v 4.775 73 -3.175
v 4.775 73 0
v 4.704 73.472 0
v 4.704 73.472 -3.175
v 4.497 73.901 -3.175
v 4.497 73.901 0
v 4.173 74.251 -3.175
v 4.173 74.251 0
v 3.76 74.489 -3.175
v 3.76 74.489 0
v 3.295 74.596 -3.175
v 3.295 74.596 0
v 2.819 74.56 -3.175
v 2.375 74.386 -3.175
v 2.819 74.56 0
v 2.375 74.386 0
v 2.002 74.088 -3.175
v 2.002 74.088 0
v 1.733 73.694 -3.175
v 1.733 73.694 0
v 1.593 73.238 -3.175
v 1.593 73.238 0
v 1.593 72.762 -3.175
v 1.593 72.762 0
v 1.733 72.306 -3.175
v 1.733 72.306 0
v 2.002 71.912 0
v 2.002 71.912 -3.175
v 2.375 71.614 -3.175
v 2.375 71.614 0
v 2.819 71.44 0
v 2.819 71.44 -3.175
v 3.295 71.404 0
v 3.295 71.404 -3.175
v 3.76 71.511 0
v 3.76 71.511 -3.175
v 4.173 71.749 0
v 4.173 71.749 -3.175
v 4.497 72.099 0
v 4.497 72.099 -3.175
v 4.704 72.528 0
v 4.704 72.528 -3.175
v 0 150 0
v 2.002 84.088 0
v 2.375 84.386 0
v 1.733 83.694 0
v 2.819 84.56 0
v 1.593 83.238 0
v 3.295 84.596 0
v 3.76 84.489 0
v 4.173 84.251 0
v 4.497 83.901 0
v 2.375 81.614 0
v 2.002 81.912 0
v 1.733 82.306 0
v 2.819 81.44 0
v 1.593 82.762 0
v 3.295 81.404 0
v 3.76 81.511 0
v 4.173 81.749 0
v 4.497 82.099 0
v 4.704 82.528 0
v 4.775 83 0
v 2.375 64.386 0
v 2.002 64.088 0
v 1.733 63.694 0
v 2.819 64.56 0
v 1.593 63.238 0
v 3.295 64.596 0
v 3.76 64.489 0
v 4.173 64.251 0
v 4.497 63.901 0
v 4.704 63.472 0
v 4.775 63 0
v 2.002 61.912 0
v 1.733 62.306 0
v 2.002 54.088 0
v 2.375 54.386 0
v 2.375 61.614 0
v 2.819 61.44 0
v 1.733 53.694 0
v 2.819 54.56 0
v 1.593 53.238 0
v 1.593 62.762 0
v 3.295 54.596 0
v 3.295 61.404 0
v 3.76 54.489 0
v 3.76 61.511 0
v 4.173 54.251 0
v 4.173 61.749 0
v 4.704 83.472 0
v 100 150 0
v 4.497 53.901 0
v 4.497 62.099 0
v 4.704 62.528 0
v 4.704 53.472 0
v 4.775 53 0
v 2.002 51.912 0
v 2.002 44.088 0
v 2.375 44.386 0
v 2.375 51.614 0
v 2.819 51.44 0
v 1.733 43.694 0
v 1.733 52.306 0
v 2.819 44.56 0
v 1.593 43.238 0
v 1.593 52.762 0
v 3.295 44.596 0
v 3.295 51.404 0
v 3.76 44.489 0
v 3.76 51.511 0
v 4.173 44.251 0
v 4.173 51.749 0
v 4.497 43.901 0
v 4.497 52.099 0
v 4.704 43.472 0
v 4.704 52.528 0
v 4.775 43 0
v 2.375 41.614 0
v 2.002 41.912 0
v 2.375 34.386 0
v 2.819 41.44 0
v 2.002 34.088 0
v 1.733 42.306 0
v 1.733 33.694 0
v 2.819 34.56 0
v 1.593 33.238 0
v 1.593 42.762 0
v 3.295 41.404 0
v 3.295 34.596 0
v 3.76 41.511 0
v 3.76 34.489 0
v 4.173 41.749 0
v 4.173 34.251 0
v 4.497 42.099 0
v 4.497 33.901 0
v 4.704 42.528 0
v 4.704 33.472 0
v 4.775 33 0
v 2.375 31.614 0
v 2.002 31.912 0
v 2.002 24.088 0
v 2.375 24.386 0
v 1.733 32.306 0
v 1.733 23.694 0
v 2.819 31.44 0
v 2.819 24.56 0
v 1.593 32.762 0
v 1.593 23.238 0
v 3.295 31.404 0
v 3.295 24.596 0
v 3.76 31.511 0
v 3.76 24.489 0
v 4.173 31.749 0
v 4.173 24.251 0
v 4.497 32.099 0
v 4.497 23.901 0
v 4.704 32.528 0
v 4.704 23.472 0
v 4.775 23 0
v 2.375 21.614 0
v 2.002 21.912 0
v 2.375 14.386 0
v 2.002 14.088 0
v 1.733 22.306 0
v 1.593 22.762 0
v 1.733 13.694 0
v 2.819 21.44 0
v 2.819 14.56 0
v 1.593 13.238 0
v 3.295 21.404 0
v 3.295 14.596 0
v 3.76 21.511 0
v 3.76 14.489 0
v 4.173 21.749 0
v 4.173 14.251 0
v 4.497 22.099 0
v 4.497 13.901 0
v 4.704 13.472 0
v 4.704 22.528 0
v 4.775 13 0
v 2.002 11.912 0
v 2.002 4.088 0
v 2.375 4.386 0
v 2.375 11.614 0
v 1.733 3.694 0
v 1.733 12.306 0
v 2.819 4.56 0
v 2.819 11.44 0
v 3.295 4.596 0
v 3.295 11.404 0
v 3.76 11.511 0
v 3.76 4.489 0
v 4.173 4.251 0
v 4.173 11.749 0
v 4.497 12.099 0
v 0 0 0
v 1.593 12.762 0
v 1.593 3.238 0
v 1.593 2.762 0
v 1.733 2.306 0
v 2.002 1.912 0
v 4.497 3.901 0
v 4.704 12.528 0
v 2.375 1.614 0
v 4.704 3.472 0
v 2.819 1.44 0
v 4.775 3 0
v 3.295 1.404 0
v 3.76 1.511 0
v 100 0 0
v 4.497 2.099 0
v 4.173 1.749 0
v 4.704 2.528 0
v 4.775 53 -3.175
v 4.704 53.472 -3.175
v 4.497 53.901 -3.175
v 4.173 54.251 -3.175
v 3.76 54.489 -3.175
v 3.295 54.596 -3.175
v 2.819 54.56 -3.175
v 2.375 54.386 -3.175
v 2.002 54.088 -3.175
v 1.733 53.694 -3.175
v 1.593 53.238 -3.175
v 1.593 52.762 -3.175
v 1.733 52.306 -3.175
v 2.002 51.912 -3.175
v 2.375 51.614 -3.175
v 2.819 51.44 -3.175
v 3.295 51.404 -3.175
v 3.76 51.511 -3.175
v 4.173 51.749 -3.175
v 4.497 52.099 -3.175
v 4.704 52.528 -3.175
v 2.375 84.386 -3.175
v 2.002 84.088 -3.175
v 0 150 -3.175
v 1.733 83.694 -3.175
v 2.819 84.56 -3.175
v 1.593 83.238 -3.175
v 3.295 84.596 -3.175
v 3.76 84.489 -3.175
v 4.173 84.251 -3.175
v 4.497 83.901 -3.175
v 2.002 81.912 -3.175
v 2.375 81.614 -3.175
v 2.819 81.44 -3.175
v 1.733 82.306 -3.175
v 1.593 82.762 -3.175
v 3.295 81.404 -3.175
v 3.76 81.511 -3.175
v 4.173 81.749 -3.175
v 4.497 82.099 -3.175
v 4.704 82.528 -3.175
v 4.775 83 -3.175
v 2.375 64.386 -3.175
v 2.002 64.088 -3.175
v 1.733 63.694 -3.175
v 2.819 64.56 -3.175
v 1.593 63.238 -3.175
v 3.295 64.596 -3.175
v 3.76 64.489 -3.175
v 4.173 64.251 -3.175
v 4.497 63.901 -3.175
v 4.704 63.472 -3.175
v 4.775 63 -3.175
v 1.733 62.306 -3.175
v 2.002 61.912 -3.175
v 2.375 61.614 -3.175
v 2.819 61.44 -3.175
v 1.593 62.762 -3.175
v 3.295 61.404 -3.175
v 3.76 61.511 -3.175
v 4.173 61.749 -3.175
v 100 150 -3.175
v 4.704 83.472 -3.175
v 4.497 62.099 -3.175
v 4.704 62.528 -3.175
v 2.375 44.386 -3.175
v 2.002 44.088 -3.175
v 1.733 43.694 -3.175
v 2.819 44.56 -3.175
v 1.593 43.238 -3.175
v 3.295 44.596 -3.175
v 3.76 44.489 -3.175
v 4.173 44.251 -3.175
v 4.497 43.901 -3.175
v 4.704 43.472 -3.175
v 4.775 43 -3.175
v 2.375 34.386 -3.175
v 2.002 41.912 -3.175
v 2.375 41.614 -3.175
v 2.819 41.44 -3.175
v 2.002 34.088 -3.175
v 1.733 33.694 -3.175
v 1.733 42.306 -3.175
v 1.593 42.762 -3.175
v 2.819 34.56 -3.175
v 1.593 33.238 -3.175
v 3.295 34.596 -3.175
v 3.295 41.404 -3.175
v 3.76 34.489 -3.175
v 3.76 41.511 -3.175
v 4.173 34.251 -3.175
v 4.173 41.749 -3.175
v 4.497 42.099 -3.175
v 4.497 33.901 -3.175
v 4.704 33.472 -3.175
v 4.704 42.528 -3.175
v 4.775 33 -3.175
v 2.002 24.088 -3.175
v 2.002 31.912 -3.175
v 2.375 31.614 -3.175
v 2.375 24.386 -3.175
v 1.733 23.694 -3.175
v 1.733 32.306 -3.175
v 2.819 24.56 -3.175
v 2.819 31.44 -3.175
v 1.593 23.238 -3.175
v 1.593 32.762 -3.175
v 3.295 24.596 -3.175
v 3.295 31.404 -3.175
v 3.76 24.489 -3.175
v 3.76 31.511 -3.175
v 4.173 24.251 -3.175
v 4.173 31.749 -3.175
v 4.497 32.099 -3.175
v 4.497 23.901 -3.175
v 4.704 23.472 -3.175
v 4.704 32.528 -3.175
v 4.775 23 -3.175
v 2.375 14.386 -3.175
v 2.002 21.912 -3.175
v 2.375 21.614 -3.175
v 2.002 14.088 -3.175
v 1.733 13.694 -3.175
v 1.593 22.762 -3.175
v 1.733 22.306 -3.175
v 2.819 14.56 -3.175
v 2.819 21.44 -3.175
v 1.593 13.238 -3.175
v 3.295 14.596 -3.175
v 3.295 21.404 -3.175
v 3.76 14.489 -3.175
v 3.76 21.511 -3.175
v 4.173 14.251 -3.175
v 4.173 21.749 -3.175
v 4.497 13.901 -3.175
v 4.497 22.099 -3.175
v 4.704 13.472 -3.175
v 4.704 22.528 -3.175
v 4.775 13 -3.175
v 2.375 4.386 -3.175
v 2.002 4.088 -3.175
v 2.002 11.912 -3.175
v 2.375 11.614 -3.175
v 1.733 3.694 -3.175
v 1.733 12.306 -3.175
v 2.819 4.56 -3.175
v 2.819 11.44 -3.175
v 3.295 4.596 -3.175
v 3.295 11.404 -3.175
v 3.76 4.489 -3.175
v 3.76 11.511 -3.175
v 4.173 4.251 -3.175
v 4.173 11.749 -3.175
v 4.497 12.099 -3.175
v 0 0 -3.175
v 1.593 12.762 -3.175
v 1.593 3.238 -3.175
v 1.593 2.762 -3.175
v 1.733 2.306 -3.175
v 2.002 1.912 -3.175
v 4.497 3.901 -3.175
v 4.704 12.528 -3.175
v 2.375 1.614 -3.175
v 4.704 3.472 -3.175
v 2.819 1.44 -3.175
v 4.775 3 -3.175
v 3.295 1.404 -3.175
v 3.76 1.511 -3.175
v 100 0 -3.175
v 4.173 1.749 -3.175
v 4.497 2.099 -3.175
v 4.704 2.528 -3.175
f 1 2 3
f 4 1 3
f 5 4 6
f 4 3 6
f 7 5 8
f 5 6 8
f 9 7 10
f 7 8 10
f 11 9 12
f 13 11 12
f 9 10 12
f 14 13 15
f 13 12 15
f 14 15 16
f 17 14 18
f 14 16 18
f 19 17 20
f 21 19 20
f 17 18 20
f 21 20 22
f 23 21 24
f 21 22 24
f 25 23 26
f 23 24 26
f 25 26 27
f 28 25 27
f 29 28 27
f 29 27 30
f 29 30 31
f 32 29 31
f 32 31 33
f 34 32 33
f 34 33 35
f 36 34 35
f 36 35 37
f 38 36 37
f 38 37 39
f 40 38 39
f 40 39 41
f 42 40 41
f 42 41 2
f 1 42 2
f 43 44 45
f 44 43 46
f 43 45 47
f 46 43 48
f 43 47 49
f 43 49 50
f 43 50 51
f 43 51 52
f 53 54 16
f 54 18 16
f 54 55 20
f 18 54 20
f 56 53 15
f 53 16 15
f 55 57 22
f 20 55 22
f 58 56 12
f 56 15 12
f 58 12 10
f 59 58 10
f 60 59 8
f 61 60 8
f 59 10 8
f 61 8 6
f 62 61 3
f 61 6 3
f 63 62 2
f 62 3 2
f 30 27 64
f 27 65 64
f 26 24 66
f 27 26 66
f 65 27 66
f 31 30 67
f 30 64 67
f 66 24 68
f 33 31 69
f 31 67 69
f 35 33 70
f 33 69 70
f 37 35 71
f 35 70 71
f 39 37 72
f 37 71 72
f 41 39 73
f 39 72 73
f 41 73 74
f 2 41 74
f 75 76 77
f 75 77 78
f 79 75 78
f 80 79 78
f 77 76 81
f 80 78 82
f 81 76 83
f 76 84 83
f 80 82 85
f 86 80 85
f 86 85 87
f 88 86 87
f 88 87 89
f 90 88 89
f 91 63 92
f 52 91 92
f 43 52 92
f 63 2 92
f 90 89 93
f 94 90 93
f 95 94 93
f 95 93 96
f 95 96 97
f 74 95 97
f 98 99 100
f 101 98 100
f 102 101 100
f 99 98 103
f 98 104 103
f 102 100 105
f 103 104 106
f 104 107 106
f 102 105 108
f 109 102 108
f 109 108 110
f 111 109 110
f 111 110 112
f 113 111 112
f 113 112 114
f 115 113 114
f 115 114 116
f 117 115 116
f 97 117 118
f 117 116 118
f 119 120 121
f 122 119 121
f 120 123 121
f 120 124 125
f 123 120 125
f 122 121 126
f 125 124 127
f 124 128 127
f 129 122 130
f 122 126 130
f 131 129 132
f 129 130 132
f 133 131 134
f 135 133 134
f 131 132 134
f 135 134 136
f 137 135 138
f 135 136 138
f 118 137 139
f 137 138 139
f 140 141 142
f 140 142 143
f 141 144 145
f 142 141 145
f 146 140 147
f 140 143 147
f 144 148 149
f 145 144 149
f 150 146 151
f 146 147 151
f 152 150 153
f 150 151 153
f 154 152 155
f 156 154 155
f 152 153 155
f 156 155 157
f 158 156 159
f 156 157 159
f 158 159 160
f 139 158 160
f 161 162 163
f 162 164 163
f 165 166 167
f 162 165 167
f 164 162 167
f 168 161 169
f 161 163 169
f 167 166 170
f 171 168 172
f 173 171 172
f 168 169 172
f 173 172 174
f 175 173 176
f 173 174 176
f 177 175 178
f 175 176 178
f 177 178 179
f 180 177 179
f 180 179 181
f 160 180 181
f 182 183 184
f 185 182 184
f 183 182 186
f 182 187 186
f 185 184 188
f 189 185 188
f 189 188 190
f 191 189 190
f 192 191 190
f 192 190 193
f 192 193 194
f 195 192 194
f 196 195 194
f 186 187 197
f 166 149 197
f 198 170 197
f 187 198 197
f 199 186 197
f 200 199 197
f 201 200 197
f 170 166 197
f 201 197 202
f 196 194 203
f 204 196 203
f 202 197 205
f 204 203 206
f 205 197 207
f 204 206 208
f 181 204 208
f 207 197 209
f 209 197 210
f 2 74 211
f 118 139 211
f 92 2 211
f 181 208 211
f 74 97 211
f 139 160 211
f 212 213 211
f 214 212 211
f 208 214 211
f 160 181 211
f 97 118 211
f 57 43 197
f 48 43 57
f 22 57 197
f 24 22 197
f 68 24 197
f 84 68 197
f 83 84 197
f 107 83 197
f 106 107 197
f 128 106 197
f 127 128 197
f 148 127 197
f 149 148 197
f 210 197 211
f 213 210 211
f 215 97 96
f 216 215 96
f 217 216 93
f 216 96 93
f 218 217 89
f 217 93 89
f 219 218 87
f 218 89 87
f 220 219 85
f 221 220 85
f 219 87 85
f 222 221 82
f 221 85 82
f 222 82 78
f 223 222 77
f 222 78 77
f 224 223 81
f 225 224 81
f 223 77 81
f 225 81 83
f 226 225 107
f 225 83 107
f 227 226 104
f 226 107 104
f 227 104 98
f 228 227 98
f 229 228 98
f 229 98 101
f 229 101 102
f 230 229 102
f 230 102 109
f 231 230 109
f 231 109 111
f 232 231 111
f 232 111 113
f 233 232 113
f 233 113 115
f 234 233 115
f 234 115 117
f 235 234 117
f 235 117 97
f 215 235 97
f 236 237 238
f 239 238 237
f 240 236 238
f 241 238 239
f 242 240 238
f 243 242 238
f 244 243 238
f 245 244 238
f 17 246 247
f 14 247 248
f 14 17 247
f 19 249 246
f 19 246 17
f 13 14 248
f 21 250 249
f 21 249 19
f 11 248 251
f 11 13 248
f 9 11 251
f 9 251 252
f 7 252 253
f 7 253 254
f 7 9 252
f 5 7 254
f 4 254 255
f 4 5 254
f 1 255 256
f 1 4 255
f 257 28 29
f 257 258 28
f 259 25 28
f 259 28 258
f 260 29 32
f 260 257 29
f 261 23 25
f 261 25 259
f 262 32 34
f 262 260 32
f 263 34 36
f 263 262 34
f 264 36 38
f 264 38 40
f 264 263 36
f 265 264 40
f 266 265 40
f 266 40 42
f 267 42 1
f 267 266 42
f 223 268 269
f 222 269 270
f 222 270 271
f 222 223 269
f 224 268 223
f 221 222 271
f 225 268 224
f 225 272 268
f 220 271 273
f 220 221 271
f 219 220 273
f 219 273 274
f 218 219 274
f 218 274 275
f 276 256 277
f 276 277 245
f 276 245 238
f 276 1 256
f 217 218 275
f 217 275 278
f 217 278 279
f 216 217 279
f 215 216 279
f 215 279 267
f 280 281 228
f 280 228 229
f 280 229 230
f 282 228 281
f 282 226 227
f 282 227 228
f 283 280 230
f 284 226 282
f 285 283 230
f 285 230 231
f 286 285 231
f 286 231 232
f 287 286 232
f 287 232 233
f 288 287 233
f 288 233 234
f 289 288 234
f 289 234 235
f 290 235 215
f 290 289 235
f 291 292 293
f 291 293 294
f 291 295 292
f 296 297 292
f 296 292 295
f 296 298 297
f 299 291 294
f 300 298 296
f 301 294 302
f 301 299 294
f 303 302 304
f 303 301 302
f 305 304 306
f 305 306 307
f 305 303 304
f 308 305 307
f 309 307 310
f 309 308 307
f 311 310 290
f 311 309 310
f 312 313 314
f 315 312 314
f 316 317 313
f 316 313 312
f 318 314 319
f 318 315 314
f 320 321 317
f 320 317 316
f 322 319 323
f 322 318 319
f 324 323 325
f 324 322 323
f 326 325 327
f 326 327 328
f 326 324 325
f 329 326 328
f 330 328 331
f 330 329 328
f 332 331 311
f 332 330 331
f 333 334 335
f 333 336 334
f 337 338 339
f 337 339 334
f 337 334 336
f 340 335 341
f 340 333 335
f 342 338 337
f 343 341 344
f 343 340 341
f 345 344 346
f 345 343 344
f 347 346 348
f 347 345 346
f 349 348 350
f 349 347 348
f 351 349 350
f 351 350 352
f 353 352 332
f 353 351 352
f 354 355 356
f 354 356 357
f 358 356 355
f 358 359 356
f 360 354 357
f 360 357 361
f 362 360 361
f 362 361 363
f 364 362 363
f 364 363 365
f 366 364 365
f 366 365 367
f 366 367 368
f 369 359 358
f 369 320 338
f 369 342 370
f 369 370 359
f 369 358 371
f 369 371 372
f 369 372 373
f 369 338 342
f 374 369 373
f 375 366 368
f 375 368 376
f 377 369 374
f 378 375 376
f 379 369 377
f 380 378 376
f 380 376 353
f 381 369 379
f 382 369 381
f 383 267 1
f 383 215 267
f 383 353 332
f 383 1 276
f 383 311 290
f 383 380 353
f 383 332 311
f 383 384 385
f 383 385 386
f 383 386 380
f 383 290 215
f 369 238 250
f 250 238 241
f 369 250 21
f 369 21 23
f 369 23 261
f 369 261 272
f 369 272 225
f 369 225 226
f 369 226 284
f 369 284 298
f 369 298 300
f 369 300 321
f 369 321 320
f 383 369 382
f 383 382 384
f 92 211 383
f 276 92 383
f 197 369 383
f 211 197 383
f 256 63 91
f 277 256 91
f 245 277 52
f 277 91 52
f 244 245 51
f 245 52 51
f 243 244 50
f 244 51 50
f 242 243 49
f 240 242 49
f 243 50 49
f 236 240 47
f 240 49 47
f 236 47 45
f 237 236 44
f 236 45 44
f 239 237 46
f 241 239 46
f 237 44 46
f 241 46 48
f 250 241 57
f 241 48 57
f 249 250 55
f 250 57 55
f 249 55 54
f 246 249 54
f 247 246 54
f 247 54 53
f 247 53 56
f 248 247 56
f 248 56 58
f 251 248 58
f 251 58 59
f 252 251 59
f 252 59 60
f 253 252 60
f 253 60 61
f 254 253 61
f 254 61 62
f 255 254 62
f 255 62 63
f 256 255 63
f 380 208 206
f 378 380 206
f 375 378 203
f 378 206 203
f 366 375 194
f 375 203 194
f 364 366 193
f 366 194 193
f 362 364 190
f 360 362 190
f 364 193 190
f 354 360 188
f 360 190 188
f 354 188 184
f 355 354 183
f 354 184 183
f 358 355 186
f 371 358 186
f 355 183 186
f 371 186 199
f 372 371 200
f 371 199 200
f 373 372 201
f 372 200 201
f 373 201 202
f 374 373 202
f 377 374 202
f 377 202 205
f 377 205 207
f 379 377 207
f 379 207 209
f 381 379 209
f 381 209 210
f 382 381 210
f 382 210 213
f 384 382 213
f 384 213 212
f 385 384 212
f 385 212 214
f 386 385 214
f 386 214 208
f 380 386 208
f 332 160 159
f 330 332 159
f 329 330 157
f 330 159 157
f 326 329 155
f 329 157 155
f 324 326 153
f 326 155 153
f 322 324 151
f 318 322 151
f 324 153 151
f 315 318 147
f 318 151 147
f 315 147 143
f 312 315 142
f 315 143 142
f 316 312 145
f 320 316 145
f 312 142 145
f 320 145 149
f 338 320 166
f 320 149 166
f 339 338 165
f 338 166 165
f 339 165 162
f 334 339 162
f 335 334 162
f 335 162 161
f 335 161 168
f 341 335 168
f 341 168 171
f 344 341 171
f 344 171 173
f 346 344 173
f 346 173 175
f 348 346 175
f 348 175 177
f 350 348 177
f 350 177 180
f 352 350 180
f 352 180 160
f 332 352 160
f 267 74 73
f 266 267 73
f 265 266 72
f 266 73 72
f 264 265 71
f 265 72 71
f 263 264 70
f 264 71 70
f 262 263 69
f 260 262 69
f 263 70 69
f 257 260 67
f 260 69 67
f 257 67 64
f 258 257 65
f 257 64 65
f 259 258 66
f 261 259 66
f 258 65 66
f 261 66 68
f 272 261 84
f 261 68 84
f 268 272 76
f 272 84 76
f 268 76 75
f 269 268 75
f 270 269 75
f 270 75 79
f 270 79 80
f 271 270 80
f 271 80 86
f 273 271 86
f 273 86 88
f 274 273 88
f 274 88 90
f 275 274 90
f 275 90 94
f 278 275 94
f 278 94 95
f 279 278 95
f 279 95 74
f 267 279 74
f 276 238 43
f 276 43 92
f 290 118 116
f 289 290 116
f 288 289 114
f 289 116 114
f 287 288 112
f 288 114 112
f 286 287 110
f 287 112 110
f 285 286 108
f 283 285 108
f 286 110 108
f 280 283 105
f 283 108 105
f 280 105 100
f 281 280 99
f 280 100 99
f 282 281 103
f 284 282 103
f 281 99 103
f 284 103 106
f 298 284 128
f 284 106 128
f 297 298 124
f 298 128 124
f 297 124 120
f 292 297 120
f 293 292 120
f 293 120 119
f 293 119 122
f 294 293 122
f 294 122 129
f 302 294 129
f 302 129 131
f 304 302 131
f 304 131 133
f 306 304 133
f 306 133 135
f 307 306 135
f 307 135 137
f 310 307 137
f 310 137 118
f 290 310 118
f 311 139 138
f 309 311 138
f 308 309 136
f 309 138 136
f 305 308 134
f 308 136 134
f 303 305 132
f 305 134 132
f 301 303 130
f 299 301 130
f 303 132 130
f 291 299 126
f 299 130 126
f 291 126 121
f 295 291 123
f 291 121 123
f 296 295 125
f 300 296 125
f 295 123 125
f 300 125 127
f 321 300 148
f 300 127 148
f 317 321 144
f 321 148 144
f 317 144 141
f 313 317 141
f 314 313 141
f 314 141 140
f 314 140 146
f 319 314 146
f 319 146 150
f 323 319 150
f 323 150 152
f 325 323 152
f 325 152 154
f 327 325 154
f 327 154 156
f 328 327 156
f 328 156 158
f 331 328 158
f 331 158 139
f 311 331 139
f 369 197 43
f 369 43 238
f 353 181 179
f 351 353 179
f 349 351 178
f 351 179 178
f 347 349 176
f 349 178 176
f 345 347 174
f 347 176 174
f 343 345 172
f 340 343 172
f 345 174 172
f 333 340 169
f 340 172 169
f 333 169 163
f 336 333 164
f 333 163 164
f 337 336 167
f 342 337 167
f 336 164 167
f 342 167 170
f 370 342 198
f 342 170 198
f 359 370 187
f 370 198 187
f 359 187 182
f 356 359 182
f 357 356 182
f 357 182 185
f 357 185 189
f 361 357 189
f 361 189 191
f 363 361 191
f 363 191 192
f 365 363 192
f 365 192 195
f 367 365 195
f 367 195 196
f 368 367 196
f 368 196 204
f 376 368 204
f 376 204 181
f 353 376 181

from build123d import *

# Parameters (mm, degrees)
SKETCH1_W           = 100
SKETCH1_H           = 3.175
BOSS_EXTRUDE1_DEPTH = 150
SKETCH2_R           = 1.6
CUT_EXTRUDE2_DEPTH  = 5
SKETCH2_14_R        = 1.6
CUT_EXTRUDE3_DEPTH  = 5
SKETCH2_15_R        = 1.6
CUT_EXTRUDE4_DEPTH  = 5
SKETCH2_16_R        = 1.6
CUT_EXTRUDE5_DEPTH  = 5
SKETCH2_17_R        = 1.6
CUT_EXTRUDE6_DEPTH  = 5
SKETCH2_18_R        = 1.6
CUT_EXTRUDE7_DEPTH  = 5
SKETCH2_19_R        = 1.6
CUT_EXTRUDE8_DEPTH  = 5
SKETCH2_20_R        = 1.6
CUT_EXTRUDE9_DEPTH  = 5
SKETCH2_21_R        = 1.6
CUT_EXTRUDE10_DEPTH = 5


with BuildPart() as part:
    # Sketch1 → Boss-Extrude1 (new body)
    with BuildSketch(Plane(origin=(0, 0, 0), x_dir=(1, 0, 0), z_dir=(0, 1, 0))):
        with Locations((50, 1.5875)):
            Rectangle(SKETCH1_W, SKETCH1_H)
    extrude(amount=BOSS_EXTRUDE1_DEPTH)

    # Sketch2 → Cut-Extrude2 (cut)
    with BuildSketch(Plane.XY):
        with Locations((3.175, 83)):
            Circle(SKETCH2_R)
    extrude(amount=-CUT_EXTRUDE2_DEPTH, mode=Mode.SUBTRACT)

    # Sketch2<14> → Cut-Extrude3 (cut)
    with BuildSketch(Plane.XY):
        with Locations((3.175, 73)):
            Circle(SKETCH2_14_R)
    extrude(amount=-CUT_EXTRUDE3_DEPTH, mode=Mode.SUBTRACT)

    # Sketch2<15> → Cut-Extrude4 (cut)
    with BuildSketch(Plane.XY):
        with Locations((3.175, 53)):
            Circle(SKETCH2_15_R)
    extrude(amount=-CUT_EXTRUDE4_DEPTH, mode=Mode.SUBTRACT)

    # Sketch2<16> → Cut-Extrude5 (cut)
    with BuildSketch(Plane.XY):
        with Locations((3.175, 63)):
            Circle(SKETCH2_16_R)
    extrude(amount=-CUT_EXTRUDE5_DEPTH, mode=Mode.SUBTRACT)

    # Sketch2<17> → Cut-Extrude6 (cut)
    with BuildSketch(Plane.XY):
        with Locations((3.175, 43)):
            Circle(SKETCH2_17_R)
    extrude(amount=-CUT_EXTRUDE6_DEPTH, mode=Mode.SUBTRACT)

    # Sketch2<18> → Cut-Extrude7 (cut)
    with BuildSketch(Plane.XY):
        with Locations((3.175, 33)):
            Circle(SKETCH2_18_R)
    extrude(amount=-CUT_EXTRUDE7_DEPTH, mode=Mode.SUBTRACT)

    # Sketch2<19> → Cut-Extrude8 (cut)
    with BuildSketch(Plane.XY):
        with Locations((3.175, 23)):
            Circle(SKETCH2_19_R)
    extrude(amount=-CUT_EXTRUDE8_DEPTH, mode=Mode.SUBTRACT)

    # Sketch2<20> → Cut-Extrude9 (cut)
    with BuildSketch(Plane.XY):
        with Locations((3.175, 13)):
            Circle(SKETCH2_20_R)
    extrude(amount=-CUT_EXTRUDE9_DEPTH, mode=Mode.SUBTRACT)

    # Sketch2<21> → Cut-Extrude10 (cut)
    with BuildSketch(Plane.XY):
        with Locations((3.175, 3)):
            Circle(SKETCH2_21_R)
    extrude(amount=-CUT_EXTRUDE10_DEPTH, mode=Mode.SUBTRACT)


solid = part.part
